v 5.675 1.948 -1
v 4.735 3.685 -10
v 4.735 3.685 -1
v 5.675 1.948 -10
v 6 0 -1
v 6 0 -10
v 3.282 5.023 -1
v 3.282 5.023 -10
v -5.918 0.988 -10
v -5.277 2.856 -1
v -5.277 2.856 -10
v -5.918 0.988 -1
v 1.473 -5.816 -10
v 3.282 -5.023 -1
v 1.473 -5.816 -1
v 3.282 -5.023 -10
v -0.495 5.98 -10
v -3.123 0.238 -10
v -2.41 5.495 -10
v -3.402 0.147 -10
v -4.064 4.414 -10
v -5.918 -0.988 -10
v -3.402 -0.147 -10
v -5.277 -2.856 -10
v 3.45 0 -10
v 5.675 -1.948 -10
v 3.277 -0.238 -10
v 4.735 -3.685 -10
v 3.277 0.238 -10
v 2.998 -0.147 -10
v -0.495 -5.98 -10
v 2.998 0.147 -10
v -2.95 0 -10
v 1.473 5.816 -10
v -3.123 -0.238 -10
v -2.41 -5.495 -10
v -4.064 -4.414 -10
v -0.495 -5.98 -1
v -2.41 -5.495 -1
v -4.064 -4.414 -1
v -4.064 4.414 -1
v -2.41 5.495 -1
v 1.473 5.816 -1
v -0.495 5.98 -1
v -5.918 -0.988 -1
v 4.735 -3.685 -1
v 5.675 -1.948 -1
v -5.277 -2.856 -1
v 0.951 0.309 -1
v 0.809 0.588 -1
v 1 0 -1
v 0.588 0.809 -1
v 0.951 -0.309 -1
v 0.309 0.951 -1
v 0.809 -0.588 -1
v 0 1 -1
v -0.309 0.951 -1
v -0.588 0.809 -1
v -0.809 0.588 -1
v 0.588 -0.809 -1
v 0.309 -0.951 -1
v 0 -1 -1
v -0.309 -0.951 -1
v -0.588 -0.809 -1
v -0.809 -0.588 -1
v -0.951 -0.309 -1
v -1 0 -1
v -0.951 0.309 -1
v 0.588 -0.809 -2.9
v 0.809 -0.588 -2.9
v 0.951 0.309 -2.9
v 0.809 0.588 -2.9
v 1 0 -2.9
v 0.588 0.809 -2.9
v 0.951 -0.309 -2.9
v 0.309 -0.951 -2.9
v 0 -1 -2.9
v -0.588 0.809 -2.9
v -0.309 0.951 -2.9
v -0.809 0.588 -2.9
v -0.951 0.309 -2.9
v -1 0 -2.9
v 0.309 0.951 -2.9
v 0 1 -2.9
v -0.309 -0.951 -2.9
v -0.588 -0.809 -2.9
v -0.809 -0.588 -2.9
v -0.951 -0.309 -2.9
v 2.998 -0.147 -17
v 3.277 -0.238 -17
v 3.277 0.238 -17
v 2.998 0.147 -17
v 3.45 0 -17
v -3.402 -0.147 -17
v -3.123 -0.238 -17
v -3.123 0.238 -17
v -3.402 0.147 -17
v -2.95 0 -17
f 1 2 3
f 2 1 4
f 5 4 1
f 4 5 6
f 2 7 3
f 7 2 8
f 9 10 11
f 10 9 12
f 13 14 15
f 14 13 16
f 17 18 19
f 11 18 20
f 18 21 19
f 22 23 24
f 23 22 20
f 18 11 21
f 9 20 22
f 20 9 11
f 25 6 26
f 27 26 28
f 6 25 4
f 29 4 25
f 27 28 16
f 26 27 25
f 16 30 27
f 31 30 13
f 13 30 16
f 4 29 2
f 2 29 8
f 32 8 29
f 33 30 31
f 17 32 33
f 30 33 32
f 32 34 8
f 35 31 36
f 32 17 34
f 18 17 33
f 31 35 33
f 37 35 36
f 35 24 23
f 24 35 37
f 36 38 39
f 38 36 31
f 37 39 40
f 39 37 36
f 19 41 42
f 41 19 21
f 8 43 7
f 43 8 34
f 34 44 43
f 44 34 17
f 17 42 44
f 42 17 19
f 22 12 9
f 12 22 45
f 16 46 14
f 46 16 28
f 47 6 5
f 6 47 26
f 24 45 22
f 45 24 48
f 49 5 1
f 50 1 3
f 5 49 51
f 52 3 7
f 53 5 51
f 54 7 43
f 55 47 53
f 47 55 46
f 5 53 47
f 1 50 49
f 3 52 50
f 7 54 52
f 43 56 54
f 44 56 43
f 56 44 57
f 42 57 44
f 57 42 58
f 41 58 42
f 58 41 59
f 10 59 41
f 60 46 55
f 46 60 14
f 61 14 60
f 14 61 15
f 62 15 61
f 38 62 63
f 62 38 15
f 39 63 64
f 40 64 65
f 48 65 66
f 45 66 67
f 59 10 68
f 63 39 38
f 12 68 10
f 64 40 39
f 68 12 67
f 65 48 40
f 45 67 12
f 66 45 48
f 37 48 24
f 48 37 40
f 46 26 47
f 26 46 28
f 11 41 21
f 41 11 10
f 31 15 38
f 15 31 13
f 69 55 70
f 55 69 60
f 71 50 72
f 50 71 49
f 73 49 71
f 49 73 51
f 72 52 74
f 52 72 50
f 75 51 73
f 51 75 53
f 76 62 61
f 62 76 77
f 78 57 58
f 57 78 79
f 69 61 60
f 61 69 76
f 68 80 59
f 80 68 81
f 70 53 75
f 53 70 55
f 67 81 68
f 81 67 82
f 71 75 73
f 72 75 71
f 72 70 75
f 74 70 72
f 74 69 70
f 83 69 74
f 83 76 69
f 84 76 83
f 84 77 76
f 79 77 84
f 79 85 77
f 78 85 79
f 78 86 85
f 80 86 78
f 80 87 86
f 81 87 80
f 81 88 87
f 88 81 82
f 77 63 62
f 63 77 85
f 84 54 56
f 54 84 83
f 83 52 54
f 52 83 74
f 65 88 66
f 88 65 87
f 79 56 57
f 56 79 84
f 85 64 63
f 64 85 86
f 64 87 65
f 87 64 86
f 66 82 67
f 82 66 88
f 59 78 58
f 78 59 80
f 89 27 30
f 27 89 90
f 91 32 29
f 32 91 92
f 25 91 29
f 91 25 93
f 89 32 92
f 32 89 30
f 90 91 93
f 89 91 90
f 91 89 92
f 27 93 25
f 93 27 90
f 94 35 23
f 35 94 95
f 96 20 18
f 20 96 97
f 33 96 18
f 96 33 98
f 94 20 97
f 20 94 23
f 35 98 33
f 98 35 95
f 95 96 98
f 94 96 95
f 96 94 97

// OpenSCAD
piezoBuzzer();
module piezoBuzzer(){
    translate([0,0,-10]){
        translate([3.2,0,-7]) color("white") cylinder(d=0.5,h=7);
        translate([-3.2,0,-7]) color("white") cylinder(d=0.5,h=7);
        difference(){
            cylinder(d=12,h=9);
            translate([0,0,7.1]) cylinder(d=2,h=2,$fn=20);
        }
    }
}
